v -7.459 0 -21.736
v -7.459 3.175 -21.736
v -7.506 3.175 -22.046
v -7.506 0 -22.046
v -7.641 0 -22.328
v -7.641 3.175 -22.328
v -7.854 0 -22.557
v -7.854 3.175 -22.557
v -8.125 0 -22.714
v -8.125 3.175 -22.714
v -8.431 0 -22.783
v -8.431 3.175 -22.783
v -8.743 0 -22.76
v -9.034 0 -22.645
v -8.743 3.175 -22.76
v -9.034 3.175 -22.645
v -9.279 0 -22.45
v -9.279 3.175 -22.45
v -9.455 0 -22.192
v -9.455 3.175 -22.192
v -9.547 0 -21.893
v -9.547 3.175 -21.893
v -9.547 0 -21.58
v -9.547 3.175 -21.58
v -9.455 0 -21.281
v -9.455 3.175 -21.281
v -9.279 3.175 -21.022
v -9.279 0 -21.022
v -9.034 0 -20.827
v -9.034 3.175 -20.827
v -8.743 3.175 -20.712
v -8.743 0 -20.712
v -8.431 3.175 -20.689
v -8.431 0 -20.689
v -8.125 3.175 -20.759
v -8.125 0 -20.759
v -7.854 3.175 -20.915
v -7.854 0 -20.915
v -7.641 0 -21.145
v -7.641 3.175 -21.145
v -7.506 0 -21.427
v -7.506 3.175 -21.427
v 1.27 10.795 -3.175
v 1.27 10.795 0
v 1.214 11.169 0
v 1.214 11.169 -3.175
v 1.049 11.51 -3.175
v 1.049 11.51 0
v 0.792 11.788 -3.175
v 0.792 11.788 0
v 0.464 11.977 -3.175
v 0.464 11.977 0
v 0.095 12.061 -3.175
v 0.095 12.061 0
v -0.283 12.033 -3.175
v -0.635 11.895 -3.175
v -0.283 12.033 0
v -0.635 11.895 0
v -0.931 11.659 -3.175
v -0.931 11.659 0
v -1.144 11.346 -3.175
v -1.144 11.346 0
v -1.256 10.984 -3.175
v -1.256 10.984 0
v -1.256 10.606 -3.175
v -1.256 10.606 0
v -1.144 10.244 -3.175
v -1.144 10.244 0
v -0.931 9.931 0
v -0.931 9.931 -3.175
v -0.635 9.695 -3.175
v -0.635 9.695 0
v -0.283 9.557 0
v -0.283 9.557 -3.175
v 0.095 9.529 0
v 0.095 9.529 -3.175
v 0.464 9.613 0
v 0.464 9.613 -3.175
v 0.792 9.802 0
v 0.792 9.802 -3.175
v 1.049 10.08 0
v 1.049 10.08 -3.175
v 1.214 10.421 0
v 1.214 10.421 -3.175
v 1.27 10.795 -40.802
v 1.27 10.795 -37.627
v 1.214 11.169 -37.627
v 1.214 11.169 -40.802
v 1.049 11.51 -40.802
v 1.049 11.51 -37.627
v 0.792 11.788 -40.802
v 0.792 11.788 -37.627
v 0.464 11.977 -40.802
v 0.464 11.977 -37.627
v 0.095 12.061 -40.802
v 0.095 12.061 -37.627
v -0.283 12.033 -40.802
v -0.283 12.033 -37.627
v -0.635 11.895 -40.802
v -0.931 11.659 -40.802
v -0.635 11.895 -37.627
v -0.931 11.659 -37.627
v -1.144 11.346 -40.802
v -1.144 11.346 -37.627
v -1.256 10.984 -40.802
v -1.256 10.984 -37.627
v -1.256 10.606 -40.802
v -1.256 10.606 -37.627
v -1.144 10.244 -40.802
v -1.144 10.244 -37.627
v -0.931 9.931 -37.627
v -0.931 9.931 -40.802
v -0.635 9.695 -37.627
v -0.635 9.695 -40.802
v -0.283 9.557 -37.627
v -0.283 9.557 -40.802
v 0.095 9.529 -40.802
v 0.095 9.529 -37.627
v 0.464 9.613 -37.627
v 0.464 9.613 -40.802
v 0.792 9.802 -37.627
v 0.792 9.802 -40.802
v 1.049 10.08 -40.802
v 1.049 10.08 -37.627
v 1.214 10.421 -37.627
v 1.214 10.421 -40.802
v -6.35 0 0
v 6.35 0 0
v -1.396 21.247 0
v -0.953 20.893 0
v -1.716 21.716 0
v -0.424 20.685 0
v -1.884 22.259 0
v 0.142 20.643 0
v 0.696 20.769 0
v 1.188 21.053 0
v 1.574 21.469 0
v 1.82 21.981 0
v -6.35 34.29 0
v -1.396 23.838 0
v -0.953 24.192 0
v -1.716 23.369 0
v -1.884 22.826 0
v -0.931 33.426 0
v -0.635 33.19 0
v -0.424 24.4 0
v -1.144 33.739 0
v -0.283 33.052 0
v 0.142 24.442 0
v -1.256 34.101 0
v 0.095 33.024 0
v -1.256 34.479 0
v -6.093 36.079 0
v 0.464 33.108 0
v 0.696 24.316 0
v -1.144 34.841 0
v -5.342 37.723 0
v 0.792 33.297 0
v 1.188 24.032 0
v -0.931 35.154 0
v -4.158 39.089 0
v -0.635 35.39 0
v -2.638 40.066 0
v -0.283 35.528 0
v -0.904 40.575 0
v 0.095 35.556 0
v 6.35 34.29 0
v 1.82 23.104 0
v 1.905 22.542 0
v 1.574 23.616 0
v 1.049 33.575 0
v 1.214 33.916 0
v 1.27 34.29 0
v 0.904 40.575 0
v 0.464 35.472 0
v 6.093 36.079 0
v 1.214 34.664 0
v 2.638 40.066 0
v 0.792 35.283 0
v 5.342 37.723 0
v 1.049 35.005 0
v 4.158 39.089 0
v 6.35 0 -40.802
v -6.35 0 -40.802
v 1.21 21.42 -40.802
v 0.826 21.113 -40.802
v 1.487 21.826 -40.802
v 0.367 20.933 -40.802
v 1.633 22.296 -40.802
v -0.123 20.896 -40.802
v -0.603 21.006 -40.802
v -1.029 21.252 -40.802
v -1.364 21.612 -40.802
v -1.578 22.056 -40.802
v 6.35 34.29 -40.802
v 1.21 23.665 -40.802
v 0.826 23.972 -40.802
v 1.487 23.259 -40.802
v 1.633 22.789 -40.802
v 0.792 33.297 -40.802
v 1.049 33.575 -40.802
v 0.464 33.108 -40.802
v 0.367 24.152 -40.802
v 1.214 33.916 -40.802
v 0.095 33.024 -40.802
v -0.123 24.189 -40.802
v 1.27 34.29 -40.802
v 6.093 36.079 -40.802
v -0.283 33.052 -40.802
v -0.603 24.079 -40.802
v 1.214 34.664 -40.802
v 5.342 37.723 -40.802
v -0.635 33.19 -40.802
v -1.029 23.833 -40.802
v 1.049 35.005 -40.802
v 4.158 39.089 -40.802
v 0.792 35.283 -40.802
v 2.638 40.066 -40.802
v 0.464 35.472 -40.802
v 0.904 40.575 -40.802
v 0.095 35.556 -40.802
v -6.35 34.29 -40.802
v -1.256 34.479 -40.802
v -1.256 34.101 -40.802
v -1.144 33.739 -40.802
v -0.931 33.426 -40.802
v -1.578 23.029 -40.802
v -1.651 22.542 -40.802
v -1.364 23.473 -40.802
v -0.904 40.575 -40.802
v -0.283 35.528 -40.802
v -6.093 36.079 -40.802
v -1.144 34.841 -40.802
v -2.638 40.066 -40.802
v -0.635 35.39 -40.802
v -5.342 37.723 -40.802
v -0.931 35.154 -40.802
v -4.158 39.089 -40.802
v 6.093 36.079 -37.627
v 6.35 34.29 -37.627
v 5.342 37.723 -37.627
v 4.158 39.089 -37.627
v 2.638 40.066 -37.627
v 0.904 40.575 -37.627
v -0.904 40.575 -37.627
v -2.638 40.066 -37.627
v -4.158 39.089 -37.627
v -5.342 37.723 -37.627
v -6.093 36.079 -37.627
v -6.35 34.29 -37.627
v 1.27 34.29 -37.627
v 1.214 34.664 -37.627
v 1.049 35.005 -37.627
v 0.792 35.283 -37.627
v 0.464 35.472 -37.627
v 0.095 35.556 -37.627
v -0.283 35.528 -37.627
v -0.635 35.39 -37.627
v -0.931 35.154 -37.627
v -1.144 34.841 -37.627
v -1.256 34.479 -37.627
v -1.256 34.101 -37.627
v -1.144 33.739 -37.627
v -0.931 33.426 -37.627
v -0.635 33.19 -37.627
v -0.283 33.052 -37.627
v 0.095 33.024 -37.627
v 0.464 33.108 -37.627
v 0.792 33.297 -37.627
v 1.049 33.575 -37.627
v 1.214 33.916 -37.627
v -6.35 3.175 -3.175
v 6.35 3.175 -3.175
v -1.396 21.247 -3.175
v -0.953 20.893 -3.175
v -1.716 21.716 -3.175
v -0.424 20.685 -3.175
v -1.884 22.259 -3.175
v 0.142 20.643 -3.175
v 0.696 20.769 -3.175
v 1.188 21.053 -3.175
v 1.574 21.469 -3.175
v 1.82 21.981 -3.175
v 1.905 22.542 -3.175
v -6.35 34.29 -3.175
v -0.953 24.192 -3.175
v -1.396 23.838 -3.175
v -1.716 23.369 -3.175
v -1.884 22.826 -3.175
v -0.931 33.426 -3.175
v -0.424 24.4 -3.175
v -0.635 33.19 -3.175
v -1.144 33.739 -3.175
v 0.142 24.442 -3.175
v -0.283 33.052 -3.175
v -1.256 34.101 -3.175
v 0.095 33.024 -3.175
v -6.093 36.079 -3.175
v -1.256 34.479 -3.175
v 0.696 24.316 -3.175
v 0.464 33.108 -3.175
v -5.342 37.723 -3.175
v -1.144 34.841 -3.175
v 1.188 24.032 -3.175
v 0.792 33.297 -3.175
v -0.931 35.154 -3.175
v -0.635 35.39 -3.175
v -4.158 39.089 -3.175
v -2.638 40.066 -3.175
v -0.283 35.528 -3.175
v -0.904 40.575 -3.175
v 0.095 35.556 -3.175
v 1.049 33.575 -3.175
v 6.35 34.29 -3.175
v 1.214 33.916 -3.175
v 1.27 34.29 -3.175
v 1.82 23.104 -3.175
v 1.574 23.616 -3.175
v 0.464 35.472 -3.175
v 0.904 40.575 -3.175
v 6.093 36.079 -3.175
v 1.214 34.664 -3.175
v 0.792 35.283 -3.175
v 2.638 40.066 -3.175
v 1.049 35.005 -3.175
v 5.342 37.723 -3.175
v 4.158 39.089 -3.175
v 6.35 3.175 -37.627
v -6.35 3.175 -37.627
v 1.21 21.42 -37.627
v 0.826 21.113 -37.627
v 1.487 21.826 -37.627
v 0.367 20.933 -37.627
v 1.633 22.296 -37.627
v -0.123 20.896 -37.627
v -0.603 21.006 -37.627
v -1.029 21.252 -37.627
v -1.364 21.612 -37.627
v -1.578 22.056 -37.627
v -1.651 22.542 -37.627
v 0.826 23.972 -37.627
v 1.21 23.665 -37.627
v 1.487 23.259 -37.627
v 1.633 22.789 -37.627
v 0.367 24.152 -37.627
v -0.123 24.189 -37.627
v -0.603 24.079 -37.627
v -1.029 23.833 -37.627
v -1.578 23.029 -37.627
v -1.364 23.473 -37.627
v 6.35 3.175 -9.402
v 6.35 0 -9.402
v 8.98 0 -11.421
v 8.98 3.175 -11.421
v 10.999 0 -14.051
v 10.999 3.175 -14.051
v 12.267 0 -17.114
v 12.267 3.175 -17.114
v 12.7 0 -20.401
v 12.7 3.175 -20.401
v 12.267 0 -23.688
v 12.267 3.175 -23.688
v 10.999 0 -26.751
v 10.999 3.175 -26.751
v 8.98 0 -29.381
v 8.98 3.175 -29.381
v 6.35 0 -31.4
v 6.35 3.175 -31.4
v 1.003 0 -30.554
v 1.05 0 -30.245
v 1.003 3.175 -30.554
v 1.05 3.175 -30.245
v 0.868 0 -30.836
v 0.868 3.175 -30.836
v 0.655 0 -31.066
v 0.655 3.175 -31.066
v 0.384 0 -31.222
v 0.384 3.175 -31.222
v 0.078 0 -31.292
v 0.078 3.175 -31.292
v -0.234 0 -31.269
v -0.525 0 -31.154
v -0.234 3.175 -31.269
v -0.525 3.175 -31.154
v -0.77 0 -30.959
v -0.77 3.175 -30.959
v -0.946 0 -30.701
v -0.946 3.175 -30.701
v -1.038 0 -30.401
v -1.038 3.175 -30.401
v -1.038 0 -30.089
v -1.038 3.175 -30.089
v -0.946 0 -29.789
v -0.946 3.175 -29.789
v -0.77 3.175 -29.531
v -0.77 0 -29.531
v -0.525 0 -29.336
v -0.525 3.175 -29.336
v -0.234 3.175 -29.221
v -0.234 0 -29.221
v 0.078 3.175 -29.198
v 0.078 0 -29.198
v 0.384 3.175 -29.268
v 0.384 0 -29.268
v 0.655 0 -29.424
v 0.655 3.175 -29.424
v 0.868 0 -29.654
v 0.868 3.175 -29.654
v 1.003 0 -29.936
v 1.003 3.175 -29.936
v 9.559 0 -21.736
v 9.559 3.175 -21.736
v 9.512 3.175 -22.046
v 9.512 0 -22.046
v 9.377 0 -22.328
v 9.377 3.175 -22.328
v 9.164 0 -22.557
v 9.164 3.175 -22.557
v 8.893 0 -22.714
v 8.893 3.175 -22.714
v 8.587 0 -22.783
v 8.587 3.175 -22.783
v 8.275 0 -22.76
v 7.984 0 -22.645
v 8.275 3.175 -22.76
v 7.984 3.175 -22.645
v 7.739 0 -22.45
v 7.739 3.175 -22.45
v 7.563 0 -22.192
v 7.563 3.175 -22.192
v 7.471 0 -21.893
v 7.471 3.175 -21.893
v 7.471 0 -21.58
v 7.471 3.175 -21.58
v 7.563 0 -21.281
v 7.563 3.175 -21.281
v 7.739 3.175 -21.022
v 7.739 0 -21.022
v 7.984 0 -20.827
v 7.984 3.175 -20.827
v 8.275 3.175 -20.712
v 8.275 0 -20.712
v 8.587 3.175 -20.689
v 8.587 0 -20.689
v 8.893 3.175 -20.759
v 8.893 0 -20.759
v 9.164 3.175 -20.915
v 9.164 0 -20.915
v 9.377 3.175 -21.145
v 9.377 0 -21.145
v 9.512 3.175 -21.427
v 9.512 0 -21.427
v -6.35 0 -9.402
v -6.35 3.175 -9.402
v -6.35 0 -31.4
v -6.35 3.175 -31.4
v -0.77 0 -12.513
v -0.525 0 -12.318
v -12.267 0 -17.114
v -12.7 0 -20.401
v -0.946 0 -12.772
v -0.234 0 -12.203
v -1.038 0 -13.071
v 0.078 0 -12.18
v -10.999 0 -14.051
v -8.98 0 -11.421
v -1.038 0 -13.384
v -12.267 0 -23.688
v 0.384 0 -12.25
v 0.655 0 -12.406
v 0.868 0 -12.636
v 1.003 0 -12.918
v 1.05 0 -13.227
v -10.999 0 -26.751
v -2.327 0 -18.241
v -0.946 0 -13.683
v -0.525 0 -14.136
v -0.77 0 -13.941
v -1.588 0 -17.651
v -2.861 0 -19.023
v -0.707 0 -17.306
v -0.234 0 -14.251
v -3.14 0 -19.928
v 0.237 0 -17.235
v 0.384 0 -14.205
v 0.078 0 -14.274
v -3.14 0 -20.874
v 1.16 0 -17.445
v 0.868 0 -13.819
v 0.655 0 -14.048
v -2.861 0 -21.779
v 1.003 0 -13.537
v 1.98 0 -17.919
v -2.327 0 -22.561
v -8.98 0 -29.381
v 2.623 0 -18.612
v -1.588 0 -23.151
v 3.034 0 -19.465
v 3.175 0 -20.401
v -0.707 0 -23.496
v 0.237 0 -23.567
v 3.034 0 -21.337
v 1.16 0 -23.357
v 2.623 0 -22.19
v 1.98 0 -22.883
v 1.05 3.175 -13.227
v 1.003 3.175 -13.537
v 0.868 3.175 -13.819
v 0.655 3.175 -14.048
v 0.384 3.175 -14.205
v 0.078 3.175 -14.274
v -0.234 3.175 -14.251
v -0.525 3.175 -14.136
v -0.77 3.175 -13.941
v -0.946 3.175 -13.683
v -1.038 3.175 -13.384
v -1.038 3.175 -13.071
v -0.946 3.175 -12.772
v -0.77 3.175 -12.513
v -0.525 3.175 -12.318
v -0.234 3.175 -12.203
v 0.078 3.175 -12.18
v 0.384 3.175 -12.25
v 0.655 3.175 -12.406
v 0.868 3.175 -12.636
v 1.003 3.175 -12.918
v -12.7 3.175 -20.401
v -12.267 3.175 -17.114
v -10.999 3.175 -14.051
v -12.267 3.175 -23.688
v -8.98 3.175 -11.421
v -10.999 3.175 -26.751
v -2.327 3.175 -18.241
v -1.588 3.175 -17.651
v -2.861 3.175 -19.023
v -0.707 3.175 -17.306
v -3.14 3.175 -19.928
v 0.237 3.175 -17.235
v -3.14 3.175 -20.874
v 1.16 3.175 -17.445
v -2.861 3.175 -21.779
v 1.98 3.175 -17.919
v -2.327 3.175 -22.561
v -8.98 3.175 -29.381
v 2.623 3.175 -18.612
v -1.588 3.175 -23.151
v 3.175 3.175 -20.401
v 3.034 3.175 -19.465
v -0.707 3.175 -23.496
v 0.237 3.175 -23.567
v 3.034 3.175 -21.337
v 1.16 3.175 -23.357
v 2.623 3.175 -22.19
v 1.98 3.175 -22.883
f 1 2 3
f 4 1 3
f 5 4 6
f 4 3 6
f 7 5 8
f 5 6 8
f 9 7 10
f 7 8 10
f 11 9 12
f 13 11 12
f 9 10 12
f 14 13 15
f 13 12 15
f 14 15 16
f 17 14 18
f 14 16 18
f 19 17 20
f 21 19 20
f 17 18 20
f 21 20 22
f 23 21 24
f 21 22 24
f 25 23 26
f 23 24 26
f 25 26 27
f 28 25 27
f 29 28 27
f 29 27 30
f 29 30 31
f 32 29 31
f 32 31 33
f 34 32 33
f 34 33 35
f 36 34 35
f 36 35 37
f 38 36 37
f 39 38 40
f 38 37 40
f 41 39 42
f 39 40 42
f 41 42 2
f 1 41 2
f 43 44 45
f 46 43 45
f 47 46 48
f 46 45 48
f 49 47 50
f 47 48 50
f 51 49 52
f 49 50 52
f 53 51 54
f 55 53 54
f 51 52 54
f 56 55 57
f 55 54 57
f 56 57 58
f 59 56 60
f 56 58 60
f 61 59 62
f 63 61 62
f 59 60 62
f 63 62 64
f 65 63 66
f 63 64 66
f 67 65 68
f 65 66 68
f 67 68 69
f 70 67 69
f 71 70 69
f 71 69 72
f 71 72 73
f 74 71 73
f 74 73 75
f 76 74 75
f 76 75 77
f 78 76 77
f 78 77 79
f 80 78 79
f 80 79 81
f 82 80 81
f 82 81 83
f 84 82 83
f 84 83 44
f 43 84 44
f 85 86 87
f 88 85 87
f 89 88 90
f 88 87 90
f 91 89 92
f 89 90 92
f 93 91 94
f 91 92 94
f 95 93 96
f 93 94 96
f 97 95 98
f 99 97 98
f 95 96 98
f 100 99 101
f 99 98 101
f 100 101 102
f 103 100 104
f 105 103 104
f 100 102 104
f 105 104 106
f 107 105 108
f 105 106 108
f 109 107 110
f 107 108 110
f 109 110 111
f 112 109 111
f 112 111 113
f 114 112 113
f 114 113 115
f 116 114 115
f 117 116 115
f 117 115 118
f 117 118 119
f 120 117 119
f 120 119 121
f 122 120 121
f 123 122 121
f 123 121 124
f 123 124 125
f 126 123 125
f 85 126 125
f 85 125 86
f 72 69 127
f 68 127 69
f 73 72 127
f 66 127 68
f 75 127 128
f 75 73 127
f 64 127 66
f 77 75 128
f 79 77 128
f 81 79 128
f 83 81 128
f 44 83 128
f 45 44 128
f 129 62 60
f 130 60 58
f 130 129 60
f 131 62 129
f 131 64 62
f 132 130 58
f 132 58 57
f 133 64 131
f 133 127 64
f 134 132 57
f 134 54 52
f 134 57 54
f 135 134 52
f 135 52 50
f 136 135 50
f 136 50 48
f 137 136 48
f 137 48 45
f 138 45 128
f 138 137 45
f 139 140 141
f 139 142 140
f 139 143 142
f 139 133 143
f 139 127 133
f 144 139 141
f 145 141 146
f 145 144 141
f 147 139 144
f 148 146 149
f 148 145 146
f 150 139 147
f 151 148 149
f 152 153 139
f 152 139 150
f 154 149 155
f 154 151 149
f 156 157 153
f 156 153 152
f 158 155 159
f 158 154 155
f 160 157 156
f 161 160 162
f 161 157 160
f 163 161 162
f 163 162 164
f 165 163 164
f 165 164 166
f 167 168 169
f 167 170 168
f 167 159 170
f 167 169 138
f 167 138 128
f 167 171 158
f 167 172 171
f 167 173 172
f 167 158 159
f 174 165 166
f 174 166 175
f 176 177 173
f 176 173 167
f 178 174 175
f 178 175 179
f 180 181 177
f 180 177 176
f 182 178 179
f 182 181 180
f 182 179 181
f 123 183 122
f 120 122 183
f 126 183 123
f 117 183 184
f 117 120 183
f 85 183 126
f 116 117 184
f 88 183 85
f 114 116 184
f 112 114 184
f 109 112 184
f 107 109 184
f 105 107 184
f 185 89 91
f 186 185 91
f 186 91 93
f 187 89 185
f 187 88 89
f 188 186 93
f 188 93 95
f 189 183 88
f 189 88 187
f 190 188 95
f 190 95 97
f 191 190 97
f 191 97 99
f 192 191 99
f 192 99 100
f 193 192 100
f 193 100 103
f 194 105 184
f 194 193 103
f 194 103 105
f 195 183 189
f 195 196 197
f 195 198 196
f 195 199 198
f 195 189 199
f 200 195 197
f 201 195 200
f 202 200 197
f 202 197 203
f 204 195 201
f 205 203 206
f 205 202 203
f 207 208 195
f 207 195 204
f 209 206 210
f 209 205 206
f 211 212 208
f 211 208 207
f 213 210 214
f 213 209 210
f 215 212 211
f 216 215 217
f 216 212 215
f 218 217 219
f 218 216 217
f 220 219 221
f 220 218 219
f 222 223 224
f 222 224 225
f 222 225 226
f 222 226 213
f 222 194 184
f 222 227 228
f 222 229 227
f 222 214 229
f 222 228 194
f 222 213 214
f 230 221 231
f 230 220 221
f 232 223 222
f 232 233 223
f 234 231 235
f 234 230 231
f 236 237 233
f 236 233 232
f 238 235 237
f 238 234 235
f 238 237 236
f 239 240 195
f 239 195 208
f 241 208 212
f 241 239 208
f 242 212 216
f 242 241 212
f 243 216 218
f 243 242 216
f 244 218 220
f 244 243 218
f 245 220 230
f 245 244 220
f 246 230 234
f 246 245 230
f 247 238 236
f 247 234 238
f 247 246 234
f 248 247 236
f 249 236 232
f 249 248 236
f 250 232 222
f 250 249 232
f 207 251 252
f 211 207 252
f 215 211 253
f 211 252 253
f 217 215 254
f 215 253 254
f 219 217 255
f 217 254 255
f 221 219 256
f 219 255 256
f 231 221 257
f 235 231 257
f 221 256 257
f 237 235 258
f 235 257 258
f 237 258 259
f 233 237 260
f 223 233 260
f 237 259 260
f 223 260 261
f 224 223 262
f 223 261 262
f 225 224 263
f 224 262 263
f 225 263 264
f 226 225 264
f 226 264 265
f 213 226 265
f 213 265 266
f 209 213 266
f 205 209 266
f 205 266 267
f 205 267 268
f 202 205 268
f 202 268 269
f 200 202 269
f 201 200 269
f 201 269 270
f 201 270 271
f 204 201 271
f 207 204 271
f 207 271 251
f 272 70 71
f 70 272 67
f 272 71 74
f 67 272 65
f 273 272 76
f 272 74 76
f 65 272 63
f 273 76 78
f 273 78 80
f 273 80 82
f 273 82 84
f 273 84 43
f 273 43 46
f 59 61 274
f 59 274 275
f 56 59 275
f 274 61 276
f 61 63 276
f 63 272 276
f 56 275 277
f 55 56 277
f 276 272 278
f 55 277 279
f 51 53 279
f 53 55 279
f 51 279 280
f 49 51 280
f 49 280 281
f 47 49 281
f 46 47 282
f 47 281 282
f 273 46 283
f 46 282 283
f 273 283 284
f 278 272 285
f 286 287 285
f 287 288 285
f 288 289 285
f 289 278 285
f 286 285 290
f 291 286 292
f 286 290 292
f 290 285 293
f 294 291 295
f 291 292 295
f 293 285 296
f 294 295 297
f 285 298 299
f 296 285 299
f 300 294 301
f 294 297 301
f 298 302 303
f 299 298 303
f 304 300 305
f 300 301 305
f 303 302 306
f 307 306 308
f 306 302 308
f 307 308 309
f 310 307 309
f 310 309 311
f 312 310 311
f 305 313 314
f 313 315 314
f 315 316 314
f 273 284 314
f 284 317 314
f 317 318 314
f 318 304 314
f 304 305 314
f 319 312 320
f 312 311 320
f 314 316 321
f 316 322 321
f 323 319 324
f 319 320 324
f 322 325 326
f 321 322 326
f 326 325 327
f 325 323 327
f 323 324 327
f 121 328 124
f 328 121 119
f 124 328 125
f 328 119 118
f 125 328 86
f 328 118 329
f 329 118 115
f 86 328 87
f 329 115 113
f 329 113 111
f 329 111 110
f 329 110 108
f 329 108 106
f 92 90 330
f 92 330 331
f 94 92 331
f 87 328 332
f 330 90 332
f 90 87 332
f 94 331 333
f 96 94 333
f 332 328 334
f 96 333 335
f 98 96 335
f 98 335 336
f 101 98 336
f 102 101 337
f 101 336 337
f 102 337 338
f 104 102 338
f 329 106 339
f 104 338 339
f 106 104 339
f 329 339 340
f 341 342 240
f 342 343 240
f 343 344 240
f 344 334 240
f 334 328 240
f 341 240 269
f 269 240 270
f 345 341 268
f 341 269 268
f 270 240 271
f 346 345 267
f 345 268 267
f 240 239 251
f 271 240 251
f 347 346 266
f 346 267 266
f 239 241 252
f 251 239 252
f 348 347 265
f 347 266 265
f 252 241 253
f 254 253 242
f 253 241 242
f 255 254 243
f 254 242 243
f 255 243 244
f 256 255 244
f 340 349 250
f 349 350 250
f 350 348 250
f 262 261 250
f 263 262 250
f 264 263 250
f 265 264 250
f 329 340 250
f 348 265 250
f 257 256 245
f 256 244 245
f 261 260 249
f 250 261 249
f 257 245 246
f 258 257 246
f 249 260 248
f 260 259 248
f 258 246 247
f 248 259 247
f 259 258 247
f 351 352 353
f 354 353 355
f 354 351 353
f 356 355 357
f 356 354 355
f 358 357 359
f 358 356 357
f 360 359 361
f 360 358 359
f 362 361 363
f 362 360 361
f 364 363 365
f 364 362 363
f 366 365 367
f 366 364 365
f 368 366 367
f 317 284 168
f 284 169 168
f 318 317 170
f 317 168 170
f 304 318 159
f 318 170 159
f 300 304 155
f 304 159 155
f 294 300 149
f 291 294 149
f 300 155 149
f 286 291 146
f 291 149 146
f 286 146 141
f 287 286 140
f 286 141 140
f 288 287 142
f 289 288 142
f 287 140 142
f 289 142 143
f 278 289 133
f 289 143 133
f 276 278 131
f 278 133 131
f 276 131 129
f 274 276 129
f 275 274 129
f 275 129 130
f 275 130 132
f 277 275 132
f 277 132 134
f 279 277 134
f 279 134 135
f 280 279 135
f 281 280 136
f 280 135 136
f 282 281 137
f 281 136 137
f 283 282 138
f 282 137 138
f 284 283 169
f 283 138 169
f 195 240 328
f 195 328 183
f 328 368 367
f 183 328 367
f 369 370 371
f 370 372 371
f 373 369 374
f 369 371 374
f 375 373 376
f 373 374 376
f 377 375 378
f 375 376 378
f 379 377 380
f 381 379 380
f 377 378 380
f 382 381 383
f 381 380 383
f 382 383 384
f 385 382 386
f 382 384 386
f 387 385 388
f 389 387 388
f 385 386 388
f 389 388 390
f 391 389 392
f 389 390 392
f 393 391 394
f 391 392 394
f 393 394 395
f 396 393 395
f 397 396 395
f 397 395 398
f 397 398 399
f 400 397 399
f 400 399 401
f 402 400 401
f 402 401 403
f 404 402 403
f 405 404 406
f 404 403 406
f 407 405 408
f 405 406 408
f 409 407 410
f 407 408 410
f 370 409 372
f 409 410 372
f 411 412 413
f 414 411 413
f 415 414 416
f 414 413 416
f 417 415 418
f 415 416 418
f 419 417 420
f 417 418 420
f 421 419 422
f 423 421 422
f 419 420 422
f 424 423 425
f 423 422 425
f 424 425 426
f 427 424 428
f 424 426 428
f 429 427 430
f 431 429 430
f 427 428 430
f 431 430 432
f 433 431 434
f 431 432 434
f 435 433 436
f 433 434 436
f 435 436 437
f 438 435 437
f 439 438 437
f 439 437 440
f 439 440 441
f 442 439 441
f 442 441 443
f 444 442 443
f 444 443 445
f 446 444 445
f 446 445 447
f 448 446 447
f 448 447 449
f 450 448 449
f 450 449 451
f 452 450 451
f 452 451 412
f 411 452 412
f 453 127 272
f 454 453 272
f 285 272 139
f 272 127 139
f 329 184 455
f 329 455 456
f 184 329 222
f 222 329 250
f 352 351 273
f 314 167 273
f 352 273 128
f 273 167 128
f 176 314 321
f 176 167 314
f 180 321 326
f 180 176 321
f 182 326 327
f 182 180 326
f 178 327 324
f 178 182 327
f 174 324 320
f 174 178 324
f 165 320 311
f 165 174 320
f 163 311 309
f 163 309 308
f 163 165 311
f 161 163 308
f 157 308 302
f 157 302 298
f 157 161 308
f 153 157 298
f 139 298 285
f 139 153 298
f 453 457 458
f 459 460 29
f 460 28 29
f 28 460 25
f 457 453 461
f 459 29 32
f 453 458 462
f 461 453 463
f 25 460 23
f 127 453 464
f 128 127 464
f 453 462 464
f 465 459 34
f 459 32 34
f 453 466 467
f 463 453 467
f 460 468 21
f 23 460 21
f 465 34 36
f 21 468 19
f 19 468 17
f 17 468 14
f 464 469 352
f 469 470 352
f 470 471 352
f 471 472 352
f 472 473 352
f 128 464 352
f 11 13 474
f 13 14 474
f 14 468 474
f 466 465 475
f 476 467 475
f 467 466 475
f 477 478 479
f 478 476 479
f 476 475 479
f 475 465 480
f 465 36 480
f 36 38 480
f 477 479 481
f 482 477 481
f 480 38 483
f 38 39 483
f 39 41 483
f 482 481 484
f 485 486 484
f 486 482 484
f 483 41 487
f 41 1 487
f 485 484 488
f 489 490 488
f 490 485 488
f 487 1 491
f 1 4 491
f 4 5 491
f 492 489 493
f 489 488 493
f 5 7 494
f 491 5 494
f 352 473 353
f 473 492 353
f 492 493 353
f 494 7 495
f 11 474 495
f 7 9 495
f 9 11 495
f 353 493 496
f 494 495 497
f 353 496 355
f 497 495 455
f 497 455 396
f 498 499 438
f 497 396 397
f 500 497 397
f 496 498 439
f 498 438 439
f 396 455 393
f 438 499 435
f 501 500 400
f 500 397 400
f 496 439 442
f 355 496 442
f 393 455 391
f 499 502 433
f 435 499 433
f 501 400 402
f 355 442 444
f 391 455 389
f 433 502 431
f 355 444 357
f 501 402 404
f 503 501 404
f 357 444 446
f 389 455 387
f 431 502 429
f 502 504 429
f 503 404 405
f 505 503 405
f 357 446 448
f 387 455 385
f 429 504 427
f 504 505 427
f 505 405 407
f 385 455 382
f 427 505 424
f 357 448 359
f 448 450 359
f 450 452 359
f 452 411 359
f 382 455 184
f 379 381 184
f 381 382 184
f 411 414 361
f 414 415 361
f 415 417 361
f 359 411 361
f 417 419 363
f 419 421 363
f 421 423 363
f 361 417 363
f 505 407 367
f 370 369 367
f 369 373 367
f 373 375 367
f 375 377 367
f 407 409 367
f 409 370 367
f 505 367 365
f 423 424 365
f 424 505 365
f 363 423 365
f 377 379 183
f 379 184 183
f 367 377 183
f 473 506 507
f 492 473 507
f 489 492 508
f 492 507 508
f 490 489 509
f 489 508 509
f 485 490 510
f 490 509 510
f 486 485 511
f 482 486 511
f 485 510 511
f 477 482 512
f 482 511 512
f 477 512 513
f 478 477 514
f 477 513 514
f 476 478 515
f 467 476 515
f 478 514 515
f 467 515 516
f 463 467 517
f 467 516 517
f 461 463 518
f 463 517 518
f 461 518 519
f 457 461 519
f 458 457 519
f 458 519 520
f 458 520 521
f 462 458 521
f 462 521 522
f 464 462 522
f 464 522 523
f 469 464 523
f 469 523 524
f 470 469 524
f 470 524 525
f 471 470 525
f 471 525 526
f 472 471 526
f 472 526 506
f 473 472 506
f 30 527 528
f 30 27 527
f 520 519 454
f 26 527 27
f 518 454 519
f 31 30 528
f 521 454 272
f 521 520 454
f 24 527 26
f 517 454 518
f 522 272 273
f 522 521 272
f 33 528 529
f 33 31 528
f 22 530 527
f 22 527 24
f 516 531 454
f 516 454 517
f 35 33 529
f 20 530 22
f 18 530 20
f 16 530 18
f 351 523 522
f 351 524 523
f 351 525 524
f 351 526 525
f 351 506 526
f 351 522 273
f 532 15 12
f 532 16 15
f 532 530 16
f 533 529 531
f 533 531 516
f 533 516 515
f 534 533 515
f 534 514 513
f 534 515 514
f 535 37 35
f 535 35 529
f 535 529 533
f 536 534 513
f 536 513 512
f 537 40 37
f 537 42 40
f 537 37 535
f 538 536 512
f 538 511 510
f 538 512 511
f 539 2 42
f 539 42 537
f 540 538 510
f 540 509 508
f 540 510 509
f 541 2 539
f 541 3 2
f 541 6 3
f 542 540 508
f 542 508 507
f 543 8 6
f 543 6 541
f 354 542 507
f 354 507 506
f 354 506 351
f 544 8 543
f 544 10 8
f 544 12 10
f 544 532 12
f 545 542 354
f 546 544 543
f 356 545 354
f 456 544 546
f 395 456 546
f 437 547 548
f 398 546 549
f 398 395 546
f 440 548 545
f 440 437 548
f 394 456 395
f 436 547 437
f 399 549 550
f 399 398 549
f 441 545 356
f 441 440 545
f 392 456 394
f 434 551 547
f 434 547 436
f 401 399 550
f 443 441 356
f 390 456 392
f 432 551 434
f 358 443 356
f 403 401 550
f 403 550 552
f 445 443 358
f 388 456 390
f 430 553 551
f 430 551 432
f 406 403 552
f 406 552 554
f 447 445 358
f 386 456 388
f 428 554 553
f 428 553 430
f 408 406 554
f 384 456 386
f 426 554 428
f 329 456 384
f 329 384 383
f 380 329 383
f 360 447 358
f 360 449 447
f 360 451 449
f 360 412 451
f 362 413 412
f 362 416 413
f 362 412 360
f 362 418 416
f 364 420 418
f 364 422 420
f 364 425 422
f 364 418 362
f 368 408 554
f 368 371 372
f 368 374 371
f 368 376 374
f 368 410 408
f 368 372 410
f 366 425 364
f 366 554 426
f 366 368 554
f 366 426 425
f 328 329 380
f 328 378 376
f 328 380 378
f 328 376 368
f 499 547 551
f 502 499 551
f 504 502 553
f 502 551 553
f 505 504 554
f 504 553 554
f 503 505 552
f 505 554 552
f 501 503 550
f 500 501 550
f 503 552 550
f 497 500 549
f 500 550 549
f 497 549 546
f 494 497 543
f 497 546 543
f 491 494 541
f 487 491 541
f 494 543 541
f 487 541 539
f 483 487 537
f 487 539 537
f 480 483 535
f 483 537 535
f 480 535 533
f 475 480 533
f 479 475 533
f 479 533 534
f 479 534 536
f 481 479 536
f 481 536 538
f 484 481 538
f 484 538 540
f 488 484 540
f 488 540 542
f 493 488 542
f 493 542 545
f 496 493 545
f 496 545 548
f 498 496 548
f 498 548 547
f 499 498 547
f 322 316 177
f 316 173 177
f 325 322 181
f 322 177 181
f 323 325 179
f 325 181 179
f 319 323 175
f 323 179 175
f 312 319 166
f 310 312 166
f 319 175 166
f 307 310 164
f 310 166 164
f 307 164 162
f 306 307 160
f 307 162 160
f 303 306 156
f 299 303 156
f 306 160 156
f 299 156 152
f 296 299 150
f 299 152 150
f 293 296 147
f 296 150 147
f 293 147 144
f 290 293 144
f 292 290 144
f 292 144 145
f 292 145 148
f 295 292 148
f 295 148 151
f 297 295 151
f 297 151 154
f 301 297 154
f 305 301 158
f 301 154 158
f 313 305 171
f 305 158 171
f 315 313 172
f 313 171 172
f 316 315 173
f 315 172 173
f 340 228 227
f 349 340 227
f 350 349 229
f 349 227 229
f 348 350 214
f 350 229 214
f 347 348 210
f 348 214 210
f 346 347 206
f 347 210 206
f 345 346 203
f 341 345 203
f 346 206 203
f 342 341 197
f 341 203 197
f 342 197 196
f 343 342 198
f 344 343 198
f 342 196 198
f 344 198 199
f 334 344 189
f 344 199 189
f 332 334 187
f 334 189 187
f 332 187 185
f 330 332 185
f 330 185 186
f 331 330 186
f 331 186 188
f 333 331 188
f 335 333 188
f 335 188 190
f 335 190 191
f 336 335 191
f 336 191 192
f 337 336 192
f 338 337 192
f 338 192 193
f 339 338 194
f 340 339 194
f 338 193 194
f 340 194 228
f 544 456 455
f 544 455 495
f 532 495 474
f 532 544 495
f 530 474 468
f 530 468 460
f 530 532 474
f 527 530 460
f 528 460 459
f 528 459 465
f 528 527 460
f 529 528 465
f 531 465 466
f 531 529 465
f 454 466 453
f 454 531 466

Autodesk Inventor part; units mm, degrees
ref_plane "YZ Plane" through (0, 0, 0) normal (1, 0, 0) x (0, 1, 0)
ref_plane "XZ Plane" through (0, 0, 0) normal (0, 1, 0) x (-1, 0, 0)
ref_plane "XY Plane" through (0, 0, 0) normal (0, 0, 1) x (1, 0, 0)
sketch "Sketch1" plane through (0, 0, 0) normal (0, 0, 1) x (1, 0, 0)
  line L0 (-6.35, 0) -> (-6.35, 3.175)
  line L1 (-6.35, 3.175) -> (-6.35, 34.29)
  line L2 (6.35, 34.29) -> (6.35, 3.175)
  line L3 (6.35, 3.175) -> (6.35, 0)
  line L4 (6.35, 0) -> (-6.35, 0)
  arc A0 (6.35, 34.29) -> (-6.35, 34.29) centre (0, 34.29) ccw
  point P0 (0, 0)
  point P1 (0, 0)
  dimension "d3" = 12.7
  dimension "d4" = 40.64
  dimension "d26" = 6.35
  dimension "d27" = 3.175
extrude "Extrusion1" add sketch "Sketch1" against normal blind 3.175
sketch "Sketch2" plane through (0, 0, -3.175) normal (0, 0, -1) x (-1, 0, 0)
  line L0 (-6.35, 34.29) -> (-6.35, 0) projected
  line L1 (6.35, 0) -> (-6.35, 0)
  line L2 (-6.35, 0) -> (-6.35, 3.175)
  line L3 (-6.35, 3.175) -> (6.35, 3.175)
  line L4 (6.35, 3.175) -> (6.35, 0)
  point P0 (0, 0)
  point P1 (-6.35, 3.175)
  dimension "d5" = 3.175
extrude "Extrusion2" add sketch "Sketch2" along normal blind 34.452
sketch "Sketch3" plane through (0, 0, -37.627) normal (0, 0, -1) x (-1, 0, 0)
  line L0 (-6.35, 0) -> (6.35, 0) projected
  line L1 (6.35, 0) -> (-6.35, 0)
  line L2 (6.35, 0) -> (6.35, 34.29)
  line L3 (-6.35, 3.175) -> (-6.35, 0) projected
  line L4 (-6.35, 0) -> (-6.35, 3.175)
  line L5 (-6.35, 3.175) -> (-6.35, 34.29)
  arc A0 (6.35, 34.29) -> (-6.35, 34.29) centre (0, 34.29) ccw
  point P0 (0, 0)
  dimension "d45" = 6.35
  dimension "d55" = 34.29
extrude "Extrusion7" add sketch "Sketch3" along normal blind 3.175
sketch "Sketch4" plane through (-6.35, 3.175, -3.175) normal (0, 1, 0) x (1, 0, 0)
  circle A0 centre (6.35, 17.226) radius 12.7
  line L0 (0, 0) -> (0, 34.452) construction
  line L1 (0, 0) -> (12.7, 34.452) construction
  point P0 (6.35, -3.175)
  point P1 (12.7, 34.452)
  dimension "d13" = 25.4
extrude "Extrusion4" add sketch "Sketch4" against normal up to surface (3.175 mm away)
sketch "Sketch6" plane through (0, 0, 0) normal (0, 0, 1) x (1, 0, 0)
  circle A0 centre (0, 34.29) radius 1.27
  circle A1 centre (0, 10.795) radius 1.27
  line L0 (0, 10.795) -> (0, 34.29) construction
  line L1 (6.35, 0) -> (-6.35, 0) construction
  line L2 (-1.27, 22.5425) -> (0, 22.5425) construction
  line L3 (-1.27, 10.795) -> (-1.27, 34.29) construction
  arc A2 (6.35, 34.29) -> (-6.35, 34.29) centre (0, 34.29) ccw projected
  line L4 (-6.35, 3.175) -> (-6.35, 34.29) construction
  line L5 (-6.35, 10.795) -> (6.35, 10.795) construction
  point P0 (0, 0)
  point P1 (0, 0)
  dimension "d18" = 2.54
  dimension "d19" = 23.495
extrude "Extrusion6" cut sketch "Sketch6" against normal blind 500
sketch "Sketch8" plane through (-6.35, 3.175, -3.175) normal (0, 1, 0) x (1, 0, 0)
  circle A0 centre (6.35, 17.226) radius 3.175
  arc A1 (0, 28.2245) -> (0, 6.2275) centre (6.35, 17.226) ccw projected
  point P0 (6.35, -3.175)
  dimension "d36" = 6.35
extrude "Extrusion9" cut sketch "Sketch8" against normal up to next
sketch "Sketch9" plane through (0, 0, 0) normal (0, 0, 1) x (1, 0, 0)
  circle A0 centre (0, 22.5425) radius 1.905
  circle A1 centre (0, 34.29) radius 1.27 construction
  circle A2 centre (0, 10.795) radius 1.27 construction
  line L0 (0, 34.29) -> (0, 10.795) construction
  point P0 (0, 0)
  point P1 (0, 22.5425)
  dimension "d39" = 3.81
extrude "Extrusion10" cut sketch "Sketch9" against normal up to next
sketch "Sketch10" plane through (-6.35, 3.175, -3.175) normal (0, 1, 0) x (1, 0, 0)
  circle A0 centre (6.35, 10.0521) radius 1.05 projected
  circle A1 centre (-2.159, 18.5611) radius 1.05 projected
  circle A2 centre (6.35, 27.07) radius 1.05 projected
  circle A3 centre (14.859, 18.5611) radius 1.05 projected
  point P0 (6.35, -3.175)
extrude "Extrusion11" cut sketch "Sketch10" against normal up to next
sketch "Sketch12" plane through (0, 0, -40.802) normal (0, 0, -1) x (-1, 0, 0)
  circle A0 centre (0, 22.5425) radius 1.651
  circle A1 centre (0, 22.5425) radius 1.905 projected
  point P0 (0, 0)
  dimension "d52" = 3.302
extrude "Extrusion13" cut sketch "Sketch12" against normal up to next contours A0
properties part number "camerabracket" material "ABS Plastic"
